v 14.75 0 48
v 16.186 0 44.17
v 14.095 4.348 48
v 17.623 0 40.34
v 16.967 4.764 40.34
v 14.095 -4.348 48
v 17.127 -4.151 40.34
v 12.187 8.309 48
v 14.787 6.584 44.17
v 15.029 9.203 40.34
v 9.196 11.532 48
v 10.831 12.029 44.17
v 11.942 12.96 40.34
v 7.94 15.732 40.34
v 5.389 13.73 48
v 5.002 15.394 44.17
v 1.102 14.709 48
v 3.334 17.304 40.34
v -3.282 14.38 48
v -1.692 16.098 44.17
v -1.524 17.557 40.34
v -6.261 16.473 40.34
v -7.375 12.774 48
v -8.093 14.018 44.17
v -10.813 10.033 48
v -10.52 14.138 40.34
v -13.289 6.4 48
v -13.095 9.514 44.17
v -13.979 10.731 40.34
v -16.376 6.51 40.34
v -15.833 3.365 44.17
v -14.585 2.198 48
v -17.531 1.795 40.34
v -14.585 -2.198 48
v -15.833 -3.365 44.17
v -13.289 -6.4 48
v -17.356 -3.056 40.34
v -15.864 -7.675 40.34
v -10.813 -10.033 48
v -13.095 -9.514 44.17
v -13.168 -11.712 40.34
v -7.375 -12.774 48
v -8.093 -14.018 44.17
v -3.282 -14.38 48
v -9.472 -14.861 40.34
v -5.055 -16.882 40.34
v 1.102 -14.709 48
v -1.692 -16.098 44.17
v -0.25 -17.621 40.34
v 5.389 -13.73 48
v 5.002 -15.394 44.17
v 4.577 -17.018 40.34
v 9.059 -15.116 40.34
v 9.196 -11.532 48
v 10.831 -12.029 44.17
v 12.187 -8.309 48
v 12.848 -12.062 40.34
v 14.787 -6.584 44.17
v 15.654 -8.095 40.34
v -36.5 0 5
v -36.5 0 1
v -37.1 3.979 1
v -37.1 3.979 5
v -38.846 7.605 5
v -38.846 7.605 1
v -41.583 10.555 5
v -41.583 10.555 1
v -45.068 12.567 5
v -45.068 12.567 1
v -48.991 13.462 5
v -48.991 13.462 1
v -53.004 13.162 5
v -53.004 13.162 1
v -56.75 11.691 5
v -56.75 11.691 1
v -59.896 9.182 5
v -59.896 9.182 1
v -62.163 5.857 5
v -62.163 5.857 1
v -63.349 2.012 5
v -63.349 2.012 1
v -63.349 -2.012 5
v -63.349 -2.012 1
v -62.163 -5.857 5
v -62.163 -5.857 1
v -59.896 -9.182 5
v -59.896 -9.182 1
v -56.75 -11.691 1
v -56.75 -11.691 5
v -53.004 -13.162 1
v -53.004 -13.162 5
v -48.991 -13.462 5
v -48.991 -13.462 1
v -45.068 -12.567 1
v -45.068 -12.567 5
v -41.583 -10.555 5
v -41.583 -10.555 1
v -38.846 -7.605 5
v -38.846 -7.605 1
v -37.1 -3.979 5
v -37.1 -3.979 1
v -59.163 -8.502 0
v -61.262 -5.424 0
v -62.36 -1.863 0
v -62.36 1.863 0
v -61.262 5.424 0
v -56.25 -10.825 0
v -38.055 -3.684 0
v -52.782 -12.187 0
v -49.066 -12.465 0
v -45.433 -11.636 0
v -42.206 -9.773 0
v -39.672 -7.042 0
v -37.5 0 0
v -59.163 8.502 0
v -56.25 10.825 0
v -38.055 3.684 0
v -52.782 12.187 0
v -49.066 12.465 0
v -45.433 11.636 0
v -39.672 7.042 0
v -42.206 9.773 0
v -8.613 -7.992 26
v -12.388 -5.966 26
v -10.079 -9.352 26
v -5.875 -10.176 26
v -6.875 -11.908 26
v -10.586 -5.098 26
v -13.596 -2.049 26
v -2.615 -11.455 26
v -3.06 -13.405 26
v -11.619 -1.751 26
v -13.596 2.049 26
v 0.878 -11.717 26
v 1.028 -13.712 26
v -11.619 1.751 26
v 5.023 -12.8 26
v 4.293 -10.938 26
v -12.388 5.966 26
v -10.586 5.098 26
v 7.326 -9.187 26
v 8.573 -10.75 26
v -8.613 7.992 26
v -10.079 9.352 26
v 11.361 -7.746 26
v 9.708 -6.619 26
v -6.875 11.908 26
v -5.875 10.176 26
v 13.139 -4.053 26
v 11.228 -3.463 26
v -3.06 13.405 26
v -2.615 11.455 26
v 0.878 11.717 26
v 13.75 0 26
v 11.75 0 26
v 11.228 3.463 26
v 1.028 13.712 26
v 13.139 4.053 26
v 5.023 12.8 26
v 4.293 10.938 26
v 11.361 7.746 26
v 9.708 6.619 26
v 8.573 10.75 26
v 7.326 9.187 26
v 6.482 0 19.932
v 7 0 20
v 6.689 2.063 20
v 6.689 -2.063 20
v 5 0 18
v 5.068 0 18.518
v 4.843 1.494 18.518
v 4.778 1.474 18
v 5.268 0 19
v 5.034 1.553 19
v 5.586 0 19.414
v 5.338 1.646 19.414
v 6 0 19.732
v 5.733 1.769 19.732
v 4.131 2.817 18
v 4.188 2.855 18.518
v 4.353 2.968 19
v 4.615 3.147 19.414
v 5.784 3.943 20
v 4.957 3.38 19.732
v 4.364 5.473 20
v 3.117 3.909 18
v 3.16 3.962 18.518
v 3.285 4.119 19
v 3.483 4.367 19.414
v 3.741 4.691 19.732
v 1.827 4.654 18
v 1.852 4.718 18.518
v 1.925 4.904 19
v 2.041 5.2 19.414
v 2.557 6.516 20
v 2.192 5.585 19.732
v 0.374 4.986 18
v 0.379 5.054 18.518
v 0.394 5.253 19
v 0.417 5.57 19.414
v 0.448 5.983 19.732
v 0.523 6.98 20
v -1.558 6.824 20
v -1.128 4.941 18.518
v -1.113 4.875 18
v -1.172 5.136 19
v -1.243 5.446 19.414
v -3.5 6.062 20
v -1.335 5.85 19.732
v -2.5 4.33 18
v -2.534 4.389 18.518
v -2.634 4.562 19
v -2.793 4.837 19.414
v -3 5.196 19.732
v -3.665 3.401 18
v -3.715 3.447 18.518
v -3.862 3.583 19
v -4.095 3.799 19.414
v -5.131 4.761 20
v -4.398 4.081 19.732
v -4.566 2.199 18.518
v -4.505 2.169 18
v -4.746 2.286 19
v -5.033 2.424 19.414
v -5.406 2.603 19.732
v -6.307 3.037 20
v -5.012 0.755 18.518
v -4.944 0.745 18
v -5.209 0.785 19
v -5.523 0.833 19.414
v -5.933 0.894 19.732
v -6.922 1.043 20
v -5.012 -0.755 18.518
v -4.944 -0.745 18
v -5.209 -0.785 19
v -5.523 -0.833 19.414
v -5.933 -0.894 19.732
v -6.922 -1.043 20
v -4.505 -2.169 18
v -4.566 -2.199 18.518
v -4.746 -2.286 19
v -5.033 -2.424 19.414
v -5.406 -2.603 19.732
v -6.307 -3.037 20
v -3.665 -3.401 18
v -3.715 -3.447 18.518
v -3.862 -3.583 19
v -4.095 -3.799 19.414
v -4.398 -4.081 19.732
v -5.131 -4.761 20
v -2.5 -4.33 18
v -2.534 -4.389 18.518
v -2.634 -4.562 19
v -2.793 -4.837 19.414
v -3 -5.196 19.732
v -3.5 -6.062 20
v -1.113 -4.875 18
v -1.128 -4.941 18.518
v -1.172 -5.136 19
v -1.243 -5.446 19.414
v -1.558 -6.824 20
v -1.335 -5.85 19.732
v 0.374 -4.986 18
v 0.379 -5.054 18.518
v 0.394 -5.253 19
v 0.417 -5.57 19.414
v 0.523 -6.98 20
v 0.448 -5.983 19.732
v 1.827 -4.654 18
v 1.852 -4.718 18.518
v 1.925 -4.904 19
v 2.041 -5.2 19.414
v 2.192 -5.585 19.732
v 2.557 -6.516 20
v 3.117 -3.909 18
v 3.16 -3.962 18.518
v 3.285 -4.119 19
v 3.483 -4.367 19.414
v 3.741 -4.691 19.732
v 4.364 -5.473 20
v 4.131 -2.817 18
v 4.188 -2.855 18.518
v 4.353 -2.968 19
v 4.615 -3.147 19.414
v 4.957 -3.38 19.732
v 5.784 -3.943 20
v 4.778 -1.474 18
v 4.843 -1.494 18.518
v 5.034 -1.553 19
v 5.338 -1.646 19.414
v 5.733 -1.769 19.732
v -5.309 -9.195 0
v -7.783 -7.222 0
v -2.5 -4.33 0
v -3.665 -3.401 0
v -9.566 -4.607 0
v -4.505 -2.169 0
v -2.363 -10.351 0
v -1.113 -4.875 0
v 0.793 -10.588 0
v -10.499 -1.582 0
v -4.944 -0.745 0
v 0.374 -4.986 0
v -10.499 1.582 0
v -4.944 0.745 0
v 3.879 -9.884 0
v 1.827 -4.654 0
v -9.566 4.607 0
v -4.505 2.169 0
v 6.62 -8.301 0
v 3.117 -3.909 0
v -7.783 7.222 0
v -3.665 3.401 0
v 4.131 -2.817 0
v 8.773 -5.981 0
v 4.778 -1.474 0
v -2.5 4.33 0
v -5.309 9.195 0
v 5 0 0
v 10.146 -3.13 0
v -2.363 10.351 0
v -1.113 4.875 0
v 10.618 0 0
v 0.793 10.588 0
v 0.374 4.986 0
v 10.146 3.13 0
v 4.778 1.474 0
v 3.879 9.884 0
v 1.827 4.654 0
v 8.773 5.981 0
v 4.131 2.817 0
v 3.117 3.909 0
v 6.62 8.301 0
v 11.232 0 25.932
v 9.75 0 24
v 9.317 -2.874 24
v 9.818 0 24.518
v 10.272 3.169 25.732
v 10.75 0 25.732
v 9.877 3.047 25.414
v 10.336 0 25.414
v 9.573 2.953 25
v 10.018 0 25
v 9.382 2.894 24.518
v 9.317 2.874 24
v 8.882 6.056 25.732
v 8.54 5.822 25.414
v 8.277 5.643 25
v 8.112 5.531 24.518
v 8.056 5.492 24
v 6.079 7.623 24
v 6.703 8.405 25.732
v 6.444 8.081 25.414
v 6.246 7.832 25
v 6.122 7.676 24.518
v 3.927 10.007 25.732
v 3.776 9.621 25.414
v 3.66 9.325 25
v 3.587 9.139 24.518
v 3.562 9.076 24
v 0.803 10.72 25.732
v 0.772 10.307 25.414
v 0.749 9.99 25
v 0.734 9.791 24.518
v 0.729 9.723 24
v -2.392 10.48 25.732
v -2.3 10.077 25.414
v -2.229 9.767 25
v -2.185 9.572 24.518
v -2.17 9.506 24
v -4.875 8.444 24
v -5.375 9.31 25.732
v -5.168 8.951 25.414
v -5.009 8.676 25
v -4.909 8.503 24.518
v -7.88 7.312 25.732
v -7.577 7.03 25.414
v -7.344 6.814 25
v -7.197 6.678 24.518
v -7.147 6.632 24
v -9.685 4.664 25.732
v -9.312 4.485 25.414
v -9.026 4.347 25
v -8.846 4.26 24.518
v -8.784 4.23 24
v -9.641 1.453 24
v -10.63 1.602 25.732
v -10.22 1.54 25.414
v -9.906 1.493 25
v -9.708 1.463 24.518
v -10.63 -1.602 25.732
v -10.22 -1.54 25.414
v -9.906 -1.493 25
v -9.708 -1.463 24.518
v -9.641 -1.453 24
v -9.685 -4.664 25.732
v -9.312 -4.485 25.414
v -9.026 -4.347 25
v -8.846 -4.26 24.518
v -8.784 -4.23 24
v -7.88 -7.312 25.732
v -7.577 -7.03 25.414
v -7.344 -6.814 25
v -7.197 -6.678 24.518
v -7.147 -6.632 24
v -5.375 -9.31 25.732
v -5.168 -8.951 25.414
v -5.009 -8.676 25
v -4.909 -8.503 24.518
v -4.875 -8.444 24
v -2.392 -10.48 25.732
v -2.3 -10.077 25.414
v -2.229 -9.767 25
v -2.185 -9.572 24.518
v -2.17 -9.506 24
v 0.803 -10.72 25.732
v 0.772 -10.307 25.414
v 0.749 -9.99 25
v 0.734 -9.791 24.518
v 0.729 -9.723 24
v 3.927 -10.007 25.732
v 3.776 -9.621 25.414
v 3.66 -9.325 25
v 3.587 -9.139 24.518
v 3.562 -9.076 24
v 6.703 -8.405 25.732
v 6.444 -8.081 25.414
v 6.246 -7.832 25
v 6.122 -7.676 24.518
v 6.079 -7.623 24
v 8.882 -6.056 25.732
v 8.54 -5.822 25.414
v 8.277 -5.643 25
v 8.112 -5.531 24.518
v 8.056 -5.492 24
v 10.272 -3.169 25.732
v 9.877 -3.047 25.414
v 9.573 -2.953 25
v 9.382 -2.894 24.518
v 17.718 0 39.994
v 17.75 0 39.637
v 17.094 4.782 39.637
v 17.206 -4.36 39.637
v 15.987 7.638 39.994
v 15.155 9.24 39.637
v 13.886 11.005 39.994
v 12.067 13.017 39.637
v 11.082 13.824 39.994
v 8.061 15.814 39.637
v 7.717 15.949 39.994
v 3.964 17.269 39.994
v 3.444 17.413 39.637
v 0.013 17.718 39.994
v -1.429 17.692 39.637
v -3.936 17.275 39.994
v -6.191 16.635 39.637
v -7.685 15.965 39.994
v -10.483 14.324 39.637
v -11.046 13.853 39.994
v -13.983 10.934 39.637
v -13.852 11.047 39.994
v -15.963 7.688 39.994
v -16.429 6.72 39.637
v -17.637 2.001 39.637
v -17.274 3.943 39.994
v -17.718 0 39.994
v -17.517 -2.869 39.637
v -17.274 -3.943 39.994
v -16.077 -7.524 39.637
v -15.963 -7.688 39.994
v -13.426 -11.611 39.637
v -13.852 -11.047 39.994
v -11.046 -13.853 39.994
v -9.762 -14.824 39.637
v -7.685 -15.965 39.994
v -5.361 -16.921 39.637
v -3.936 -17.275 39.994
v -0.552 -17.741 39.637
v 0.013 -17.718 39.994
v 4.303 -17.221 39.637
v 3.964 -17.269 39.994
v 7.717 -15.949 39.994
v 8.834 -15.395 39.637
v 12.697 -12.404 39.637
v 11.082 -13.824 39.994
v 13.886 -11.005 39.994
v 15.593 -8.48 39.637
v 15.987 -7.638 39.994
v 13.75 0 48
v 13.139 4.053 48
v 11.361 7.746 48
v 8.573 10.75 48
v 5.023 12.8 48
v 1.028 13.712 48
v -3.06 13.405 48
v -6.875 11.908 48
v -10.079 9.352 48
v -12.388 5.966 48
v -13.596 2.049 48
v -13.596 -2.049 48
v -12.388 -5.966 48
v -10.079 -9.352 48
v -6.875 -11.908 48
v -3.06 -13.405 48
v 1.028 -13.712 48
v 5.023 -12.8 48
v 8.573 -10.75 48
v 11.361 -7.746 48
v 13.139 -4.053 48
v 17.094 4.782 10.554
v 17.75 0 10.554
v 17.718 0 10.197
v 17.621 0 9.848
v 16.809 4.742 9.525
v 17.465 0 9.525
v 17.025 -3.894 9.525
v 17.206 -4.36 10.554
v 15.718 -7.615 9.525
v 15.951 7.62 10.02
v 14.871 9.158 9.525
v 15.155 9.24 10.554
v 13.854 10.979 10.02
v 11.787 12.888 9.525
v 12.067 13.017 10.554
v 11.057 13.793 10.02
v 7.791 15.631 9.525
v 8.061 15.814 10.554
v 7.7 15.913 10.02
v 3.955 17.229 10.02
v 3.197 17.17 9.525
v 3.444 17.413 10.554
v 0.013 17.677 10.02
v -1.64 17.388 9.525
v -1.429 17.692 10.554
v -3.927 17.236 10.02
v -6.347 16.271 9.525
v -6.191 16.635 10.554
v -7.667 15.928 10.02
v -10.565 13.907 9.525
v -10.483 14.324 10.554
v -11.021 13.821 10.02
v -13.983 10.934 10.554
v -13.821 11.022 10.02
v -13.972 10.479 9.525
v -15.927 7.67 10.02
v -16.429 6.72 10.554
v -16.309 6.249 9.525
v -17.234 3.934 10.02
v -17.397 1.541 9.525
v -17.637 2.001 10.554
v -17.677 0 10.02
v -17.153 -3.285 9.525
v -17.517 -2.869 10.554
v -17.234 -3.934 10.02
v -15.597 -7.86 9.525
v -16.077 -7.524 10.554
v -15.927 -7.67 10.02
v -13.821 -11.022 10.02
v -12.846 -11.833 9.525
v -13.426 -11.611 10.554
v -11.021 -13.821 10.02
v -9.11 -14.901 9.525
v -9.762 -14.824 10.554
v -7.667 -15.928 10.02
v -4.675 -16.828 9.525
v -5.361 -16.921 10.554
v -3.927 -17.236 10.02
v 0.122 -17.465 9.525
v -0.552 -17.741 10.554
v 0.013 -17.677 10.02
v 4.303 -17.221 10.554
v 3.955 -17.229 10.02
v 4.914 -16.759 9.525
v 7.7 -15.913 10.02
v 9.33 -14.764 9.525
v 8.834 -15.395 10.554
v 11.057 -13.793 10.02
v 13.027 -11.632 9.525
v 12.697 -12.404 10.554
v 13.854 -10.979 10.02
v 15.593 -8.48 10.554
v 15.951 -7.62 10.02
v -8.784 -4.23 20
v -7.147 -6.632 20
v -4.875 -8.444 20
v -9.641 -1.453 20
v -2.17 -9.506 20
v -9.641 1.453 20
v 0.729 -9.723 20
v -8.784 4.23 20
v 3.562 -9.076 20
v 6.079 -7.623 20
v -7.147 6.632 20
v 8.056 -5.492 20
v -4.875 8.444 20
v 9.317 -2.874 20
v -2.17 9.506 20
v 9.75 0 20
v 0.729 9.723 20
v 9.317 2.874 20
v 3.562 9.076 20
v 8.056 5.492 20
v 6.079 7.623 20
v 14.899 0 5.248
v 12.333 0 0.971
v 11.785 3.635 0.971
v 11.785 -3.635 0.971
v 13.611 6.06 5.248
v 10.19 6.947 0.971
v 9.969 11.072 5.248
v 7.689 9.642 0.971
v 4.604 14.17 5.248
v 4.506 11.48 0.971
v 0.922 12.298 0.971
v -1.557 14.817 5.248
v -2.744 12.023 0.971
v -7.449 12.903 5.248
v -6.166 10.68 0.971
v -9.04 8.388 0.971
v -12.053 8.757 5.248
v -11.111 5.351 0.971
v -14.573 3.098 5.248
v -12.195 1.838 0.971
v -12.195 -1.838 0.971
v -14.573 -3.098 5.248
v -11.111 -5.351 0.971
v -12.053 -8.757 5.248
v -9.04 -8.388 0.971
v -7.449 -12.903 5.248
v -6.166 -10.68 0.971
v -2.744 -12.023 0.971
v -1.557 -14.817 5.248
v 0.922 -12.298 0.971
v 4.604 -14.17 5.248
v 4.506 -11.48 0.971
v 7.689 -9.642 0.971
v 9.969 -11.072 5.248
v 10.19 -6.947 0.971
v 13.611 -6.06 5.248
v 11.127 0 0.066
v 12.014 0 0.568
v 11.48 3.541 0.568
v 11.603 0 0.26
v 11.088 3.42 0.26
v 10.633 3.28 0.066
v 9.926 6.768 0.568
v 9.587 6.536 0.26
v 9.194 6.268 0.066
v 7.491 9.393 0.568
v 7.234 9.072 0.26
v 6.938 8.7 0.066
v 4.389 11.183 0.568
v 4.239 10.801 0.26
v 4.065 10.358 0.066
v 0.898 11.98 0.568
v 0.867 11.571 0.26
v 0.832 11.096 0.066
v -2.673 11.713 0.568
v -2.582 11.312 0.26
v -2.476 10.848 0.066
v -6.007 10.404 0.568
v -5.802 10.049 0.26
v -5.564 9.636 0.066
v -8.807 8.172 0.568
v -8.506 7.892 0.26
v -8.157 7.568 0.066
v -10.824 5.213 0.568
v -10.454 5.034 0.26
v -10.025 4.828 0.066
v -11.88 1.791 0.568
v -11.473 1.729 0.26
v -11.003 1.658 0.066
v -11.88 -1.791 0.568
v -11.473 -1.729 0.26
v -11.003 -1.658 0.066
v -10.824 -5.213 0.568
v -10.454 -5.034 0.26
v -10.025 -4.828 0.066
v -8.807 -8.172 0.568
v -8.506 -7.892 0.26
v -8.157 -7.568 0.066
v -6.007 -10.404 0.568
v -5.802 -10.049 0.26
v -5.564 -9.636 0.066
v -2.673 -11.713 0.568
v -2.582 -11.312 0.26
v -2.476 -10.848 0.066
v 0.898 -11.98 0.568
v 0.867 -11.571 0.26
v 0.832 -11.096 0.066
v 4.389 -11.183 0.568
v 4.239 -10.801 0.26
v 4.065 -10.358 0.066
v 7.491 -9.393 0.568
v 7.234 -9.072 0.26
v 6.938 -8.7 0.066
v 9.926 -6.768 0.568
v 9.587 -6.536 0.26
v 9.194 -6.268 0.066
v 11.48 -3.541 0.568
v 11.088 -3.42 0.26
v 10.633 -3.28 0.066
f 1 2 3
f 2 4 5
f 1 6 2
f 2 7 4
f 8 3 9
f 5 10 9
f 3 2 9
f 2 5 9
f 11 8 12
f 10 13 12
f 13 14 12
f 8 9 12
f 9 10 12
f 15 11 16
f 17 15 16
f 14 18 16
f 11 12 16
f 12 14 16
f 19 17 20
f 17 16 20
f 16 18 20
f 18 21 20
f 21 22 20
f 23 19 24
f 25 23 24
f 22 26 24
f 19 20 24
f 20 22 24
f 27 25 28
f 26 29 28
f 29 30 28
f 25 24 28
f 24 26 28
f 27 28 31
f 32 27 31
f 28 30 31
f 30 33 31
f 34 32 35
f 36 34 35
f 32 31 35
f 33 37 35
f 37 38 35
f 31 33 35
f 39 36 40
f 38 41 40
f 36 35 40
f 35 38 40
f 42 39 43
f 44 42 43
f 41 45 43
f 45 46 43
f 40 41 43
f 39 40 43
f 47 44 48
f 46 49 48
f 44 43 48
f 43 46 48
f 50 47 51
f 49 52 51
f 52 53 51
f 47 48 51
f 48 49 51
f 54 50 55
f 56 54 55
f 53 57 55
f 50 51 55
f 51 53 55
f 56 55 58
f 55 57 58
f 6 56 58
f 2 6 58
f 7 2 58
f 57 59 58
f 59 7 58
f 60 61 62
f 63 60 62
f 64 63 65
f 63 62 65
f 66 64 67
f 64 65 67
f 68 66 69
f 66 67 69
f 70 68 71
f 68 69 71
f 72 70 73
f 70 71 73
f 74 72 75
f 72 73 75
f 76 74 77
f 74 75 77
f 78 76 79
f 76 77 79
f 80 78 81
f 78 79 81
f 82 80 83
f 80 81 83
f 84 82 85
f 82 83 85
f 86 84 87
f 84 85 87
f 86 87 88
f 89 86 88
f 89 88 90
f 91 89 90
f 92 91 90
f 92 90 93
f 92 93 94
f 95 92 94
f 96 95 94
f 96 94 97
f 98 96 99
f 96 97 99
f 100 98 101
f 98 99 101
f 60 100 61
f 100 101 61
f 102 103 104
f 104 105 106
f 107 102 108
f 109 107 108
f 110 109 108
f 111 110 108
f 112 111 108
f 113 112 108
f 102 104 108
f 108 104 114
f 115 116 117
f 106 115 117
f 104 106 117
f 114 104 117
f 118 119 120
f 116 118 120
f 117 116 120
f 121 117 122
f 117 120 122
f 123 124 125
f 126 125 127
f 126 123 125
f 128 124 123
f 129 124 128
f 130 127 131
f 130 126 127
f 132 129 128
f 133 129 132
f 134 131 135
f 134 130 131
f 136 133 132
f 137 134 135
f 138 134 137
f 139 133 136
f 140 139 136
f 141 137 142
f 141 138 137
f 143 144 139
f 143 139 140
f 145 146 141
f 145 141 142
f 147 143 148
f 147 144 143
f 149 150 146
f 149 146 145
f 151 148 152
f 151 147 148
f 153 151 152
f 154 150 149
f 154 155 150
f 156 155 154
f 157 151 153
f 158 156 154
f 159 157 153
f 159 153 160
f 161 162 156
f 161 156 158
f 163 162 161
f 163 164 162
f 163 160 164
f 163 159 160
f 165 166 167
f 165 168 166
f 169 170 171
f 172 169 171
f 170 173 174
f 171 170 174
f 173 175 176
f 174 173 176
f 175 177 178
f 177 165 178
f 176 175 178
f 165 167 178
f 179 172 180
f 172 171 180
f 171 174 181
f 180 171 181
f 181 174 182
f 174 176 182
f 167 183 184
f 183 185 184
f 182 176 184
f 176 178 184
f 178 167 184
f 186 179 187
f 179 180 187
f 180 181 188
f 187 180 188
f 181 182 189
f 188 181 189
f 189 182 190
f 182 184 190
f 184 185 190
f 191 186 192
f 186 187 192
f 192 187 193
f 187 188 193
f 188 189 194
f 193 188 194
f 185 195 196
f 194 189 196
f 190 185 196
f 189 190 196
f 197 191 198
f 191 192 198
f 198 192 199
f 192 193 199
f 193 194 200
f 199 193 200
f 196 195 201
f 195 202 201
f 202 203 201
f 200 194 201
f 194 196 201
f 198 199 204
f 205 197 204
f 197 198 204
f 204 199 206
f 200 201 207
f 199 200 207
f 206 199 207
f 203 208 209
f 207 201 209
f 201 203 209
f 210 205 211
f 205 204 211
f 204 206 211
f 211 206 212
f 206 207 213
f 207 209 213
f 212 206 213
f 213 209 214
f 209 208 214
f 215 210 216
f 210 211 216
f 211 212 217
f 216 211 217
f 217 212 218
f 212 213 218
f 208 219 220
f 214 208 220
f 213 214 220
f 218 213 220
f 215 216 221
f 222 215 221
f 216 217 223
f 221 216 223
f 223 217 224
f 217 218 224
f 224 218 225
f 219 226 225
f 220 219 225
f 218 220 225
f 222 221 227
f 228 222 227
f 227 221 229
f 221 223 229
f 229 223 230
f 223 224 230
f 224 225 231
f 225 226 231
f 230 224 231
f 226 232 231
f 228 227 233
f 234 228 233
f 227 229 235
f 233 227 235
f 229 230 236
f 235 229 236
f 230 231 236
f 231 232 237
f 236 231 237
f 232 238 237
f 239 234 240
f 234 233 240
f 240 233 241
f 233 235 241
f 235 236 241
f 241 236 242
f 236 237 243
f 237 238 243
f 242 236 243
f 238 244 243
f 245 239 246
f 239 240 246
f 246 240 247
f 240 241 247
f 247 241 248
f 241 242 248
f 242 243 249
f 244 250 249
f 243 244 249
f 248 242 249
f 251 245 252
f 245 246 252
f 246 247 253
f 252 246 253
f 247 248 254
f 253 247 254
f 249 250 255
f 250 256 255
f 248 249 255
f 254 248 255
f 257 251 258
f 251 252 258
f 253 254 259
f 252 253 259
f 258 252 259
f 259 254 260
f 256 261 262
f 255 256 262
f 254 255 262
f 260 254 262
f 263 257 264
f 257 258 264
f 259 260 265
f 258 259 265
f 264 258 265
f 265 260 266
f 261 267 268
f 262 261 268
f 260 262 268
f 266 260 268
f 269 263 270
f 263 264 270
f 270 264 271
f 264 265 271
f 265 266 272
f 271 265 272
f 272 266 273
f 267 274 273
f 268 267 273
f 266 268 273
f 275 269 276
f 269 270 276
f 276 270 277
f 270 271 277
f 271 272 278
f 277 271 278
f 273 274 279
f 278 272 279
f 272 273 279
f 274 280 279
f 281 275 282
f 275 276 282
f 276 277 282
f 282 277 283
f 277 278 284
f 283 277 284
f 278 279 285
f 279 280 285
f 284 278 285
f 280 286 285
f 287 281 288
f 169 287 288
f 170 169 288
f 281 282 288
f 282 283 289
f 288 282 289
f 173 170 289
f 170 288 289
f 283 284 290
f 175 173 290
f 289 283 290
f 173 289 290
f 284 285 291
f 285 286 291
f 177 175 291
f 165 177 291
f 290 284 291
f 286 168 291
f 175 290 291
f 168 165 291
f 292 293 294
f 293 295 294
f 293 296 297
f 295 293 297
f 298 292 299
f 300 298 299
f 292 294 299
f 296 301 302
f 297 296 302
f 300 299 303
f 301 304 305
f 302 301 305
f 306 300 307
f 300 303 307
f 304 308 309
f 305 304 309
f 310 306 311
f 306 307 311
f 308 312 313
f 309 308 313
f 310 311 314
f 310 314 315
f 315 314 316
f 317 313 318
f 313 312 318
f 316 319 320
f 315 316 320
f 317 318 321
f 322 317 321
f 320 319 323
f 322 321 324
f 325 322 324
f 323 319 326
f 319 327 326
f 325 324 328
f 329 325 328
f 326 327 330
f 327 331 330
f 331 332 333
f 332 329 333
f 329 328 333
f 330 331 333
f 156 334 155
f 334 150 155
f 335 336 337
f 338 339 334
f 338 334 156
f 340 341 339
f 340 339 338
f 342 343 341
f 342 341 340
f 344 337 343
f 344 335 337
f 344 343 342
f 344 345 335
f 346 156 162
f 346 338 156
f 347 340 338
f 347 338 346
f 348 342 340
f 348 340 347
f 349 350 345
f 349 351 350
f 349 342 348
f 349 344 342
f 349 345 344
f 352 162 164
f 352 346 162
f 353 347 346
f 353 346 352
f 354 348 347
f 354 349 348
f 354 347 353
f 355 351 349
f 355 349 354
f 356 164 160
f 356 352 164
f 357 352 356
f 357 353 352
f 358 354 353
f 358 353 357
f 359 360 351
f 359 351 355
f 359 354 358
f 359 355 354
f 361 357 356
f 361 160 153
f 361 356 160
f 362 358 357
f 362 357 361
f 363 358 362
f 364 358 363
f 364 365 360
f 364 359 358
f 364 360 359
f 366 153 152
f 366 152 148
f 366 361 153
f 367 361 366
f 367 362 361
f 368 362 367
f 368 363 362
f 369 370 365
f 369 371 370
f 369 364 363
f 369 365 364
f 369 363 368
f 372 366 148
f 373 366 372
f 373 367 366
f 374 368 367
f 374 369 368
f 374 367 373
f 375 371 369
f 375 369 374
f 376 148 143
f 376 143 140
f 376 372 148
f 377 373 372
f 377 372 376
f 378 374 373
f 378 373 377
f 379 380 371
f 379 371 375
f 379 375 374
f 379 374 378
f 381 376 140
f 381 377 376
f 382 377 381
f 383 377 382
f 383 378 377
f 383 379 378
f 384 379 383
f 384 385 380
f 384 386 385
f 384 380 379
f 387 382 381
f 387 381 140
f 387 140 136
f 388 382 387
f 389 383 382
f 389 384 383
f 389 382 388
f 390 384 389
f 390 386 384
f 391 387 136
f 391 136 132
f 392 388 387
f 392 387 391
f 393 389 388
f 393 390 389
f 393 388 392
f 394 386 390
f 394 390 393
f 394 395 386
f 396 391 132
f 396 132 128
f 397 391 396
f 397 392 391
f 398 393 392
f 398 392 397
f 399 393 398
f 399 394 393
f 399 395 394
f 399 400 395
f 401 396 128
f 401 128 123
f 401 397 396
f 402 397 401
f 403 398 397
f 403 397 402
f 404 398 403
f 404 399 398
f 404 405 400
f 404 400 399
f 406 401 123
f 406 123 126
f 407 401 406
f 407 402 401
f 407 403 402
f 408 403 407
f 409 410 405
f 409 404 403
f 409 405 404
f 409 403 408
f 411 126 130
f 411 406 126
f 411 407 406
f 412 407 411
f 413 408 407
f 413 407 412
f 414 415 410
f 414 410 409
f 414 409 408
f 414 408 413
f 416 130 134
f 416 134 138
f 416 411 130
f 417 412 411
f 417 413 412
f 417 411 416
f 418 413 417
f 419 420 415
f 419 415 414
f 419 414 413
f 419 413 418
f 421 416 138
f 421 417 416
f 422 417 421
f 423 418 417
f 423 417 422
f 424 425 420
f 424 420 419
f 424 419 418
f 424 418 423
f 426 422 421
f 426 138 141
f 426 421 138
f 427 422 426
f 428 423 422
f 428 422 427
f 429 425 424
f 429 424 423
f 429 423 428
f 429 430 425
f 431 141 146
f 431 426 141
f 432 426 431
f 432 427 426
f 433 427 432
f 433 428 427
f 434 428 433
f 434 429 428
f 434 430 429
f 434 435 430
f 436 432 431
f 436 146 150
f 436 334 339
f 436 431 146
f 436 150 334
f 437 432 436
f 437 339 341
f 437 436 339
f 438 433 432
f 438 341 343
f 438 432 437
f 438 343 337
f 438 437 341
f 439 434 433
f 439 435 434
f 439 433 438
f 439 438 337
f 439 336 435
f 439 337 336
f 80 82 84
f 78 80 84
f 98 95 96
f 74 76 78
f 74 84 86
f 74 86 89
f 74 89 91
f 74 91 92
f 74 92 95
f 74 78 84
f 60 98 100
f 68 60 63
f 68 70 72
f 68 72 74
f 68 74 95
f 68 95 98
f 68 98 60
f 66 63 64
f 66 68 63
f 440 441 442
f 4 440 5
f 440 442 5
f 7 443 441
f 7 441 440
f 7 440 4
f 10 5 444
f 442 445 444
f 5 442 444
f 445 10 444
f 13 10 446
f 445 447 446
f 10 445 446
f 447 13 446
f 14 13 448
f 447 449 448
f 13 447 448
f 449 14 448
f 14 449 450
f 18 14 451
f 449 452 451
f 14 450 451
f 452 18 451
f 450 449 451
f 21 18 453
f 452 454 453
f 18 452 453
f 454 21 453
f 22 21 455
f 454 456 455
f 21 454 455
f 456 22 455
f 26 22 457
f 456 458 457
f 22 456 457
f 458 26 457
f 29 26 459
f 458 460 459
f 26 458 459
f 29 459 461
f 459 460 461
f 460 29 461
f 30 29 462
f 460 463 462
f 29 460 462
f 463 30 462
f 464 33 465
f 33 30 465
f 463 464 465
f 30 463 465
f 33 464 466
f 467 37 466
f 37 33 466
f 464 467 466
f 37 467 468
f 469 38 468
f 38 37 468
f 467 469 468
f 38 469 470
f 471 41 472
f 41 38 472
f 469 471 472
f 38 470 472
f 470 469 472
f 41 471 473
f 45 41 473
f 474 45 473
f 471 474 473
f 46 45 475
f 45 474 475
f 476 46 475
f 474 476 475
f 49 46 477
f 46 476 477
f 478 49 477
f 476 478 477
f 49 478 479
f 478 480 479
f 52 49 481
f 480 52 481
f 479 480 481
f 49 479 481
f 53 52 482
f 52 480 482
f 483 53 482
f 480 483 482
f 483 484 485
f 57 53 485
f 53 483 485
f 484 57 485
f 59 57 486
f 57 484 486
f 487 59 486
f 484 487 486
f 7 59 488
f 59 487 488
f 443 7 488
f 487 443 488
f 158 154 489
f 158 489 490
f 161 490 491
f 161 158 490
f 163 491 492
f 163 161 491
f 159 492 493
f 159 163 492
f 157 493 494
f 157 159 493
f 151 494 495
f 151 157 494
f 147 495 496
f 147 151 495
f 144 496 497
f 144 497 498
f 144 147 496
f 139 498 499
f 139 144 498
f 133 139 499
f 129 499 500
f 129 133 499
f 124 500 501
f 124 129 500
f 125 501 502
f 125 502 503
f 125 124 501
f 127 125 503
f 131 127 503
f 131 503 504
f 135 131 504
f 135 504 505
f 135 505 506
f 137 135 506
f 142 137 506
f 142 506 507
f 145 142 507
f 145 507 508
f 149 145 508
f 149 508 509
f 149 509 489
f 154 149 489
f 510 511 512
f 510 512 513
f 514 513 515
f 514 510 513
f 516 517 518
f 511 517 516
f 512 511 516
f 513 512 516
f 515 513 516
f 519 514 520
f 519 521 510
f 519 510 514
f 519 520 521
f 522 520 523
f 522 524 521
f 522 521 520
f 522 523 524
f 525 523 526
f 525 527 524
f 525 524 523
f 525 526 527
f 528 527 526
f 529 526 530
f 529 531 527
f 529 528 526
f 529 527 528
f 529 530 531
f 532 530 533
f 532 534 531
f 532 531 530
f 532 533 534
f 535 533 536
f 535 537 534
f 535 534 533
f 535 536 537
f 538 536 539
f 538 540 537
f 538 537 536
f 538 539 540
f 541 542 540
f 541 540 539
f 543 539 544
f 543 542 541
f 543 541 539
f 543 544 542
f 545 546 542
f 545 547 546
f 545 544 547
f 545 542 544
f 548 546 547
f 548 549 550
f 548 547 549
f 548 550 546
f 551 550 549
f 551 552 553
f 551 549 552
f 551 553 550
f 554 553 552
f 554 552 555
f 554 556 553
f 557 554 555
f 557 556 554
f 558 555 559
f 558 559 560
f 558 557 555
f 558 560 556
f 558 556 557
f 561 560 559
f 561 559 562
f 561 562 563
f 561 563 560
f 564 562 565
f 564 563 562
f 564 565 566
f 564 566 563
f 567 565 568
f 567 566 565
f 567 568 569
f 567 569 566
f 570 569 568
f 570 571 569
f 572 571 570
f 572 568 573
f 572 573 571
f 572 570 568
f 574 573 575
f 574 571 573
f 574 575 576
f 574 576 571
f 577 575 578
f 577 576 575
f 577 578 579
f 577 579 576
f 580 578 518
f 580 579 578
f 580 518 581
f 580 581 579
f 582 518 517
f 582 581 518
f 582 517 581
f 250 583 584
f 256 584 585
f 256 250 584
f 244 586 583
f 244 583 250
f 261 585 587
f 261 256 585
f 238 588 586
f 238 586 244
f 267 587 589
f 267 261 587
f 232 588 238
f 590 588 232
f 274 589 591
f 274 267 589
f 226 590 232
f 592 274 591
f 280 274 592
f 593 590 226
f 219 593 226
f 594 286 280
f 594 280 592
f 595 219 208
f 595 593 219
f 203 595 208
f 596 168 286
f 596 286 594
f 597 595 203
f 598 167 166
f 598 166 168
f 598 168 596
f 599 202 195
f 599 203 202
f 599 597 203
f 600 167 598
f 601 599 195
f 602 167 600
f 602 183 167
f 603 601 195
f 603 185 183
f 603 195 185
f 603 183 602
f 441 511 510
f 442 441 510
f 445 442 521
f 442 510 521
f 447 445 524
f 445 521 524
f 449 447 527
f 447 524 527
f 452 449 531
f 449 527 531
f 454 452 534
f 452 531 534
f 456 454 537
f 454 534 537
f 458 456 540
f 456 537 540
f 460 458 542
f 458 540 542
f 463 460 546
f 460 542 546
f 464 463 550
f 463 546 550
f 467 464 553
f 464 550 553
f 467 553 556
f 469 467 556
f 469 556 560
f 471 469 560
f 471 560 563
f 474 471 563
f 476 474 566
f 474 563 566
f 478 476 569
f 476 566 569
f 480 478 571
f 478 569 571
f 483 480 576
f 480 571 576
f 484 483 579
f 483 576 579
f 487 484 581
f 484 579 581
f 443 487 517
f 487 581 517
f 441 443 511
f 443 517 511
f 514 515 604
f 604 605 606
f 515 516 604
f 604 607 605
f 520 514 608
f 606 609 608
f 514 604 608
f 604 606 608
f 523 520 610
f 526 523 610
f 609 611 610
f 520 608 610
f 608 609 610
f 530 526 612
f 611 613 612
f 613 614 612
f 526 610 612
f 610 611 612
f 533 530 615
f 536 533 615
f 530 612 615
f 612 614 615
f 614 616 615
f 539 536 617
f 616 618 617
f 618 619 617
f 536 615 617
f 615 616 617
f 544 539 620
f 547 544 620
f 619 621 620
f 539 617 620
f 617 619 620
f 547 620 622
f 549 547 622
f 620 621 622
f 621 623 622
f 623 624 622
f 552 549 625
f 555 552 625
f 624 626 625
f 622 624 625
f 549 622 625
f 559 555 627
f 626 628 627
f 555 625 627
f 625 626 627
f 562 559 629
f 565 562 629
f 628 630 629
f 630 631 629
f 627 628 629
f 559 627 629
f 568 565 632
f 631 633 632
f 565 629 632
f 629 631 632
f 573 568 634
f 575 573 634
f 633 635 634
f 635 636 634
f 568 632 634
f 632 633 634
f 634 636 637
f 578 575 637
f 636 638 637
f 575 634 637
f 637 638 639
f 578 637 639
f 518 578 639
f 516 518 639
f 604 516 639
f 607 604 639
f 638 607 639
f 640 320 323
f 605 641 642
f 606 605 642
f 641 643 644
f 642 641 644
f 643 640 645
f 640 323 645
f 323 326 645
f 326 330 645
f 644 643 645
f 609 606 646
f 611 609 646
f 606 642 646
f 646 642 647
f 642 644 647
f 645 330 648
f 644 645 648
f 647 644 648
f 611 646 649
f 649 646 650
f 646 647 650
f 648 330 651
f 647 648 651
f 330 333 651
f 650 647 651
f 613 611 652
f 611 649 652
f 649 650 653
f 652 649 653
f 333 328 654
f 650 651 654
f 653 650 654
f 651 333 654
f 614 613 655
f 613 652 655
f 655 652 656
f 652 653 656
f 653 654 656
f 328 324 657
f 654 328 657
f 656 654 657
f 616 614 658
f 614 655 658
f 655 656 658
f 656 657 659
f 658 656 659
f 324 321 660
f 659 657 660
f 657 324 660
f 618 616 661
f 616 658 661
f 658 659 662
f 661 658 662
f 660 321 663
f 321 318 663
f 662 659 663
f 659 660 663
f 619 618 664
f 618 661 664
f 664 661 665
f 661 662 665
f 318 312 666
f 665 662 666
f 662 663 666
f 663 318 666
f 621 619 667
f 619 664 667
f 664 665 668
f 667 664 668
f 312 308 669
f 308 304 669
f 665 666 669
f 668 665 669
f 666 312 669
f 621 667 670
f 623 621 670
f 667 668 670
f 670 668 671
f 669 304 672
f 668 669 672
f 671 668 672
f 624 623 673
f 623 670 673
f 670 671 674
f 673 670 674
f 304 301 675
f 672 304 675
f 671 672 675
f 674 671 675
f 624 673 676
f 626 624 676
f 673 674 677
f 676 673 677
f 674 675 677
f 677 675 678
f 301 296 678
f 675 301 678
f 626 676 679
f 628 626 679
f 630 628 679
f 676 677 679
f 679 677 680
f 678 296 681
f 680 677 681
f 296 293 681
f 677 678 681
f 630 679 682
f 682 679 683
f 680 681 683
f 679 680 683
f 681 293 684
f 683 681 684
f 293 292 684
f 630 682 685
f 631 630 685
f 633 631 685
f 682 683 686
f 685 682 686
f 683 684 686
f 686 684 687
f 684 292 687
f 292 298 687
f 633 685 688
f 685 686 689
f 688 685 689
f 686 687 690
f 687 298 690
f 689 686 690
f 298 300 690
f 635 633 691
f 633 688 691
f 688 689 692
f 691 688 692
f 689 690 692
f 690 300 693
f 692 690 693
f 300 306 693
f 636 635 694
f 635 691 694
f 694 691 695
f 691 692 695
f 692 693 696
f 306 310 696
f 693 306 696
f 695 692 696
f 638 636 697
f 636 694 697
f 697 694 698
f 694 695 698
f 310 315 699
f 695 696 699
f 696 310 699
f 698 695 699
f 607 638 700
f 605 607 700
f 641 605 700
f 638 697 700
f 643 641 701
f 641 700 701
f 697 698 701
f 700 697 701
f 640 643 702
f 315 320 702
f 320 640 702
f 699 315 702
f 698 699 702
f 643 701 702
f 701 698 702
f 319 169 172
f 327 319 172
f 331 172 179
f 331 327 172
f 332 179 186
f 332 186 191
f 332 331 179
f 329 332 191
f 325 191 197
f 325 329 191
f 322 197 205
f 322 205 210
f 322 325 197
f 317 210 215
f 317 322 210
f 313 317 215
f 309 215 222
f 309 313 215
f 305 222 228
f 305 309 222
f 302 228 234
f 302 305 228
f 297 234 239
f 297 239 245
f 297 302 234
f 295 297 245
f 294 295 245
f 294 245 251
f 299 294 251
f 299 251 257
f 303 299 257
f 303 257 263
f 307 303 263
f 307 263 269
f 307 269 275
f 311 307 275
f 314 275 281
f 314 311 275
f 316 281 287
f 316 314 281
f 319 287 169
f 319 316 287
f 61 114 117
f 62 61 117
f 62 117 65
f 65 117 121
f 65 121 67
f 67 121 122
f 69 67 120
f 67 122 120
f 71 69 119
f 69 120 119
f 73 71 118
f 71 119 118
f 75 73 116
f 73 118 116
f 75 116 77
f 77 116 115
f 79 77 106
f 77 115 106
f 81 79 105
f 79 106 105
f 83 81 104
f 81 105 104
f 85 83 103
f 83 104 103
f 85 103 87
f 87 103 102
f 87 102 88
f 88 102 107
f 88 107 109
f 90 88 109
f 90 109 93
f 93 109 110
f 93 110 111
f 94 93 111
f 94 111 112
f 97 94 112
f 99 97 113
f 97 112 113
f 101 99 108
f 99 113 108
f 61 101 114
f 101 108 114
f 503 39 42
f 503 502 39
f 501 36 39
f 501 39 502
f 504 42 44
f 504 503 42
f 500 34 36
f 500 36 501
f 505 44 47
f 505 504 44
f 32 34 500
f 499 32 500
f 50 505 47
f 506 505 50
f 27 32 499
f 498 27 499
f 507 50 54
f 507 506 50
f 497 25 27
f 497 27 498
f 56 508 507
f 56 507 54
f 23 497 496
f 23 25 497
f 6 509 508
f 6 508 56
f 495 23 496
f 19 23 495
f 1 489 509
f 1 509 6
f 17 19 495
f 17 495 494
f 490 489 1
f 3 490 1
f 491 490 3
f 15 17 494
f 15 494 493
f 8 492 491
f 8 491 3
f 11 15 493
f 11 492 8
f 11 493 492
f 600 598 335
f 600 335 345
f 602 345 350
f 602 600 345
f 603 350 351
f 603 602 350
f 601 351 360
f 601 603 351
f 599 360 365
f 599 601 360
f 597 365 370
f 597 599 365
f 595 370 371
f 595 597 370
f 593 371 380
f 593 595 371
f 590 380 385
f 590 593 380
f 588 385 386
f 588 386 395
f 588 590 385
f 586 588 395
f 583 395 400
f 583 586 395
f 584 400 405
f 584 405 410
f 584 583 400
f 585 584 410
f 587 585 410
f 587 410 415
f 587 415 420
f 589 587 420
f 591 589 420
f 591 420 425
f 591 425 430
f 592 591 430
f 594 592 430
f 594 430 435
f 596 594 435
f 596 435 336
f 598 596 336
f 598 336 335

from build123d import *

# Parameters (mm, degrees)
F0_R     = 17.75
F0_R_2   = 13.75
F0_R_3   = 9.75
F0_R_4   = 5
F1_DEPTH = 20
F2_DEPTH = 26
F3_DEPTH = 48
F4_SIZE2 = 6
F4_SIZE  = 10
F5_SIZE2 = 8
F5_SIZE  = 3
F0_R_5   = 13.5
F6_DEPTH = 5
F7_SIZE  = 1
F8_R     = 2


with BuildPart() as f1:
    # F0 (on Top) → F1 (new body)
    with BuildSketch(Plane.XY):
        Circle(F0_R)
        Circle(F0_R_2, mode=Mode.SUBTRACT)
        Circle(F0_R_2)
        Circle(F0_R_3, mode=Mode.SUBTRACT)
        Circle(F0_R_3)
        Circle(F0_R_4, mode=Mode.SUBTRACT)
    extrude(amount=F1_DEPTH)

    # F0 (on Top) → F2 (join)
    with BuildSketch(Plane.XY):
        Circle(F0_R)
        Circle(F0_R_2, mode=Mode.SUBTRACT)
        Circle(F0_R_2)
        Circle(F0_R_3, mode=Mode.SUBTRACT)
    extrude(amount=F2_DEPTH)

    # F0 (on Top) → F3 (join)
    with BuildSketch(Plane.XY):
        Circle(F0_R)
        Circle(F0_R_2, mode=Mode.SUBTRACT)
    extrude(amount=F3_DEPTH)

    # F4
    f4_edges = [f1.edges().sort_by_distance(p)[0] for p in [
        (-17.75, 0, 0),
    ]]
    f4_side = f1.faces().sort_by_distance((-17.75, 0, 24))[0]
    chamfer(f4_edges, length=F4_SIZE, length2=F4_SIZE2, reference=f4_side)

    # F5
    f5_edges = [f1.edges().sort_by_distance(p)[0] for p in [
        (-17.75, 0, 48),
    ]]
    f5_side = f1.faces().sort_by_distance((-17.247954, 0, 48))[0]
    chamfer(f5_edges, length=F5_SIZE, length2=F5_SIZE2, reference=f5_side)

    # F8
    f8_edges = [f1.edges().sort_by_distance(p)[0] for p in [
        (-9.75, 0, 26),
        (-5, 0, 20),
        (14.75, 0, 5),
        (-17.75, 0, 10),
        (-11.75, 0, 0),
        (-17.75, 0, 40),
    ]]
    fillet(f8_edges, radius=F8_R)


with BuildPart() as f6:
    # F0 (on Top) → F6 (new body)
    with BuildSketch(Plane.XY):
        with Locations((-50, 0)):
            Circle(F0_R_5)
    extrude(amount=F6_DEPTH)

    # F7
    f7_edges = [f6.edges().sort_by_distance(p)[0] for p in [
        (-63.5, 0, 0),
    ]]
    chamfer(f7_edges, length=F7_SIZE)


solid = Compound([f1.part, f6.part])
